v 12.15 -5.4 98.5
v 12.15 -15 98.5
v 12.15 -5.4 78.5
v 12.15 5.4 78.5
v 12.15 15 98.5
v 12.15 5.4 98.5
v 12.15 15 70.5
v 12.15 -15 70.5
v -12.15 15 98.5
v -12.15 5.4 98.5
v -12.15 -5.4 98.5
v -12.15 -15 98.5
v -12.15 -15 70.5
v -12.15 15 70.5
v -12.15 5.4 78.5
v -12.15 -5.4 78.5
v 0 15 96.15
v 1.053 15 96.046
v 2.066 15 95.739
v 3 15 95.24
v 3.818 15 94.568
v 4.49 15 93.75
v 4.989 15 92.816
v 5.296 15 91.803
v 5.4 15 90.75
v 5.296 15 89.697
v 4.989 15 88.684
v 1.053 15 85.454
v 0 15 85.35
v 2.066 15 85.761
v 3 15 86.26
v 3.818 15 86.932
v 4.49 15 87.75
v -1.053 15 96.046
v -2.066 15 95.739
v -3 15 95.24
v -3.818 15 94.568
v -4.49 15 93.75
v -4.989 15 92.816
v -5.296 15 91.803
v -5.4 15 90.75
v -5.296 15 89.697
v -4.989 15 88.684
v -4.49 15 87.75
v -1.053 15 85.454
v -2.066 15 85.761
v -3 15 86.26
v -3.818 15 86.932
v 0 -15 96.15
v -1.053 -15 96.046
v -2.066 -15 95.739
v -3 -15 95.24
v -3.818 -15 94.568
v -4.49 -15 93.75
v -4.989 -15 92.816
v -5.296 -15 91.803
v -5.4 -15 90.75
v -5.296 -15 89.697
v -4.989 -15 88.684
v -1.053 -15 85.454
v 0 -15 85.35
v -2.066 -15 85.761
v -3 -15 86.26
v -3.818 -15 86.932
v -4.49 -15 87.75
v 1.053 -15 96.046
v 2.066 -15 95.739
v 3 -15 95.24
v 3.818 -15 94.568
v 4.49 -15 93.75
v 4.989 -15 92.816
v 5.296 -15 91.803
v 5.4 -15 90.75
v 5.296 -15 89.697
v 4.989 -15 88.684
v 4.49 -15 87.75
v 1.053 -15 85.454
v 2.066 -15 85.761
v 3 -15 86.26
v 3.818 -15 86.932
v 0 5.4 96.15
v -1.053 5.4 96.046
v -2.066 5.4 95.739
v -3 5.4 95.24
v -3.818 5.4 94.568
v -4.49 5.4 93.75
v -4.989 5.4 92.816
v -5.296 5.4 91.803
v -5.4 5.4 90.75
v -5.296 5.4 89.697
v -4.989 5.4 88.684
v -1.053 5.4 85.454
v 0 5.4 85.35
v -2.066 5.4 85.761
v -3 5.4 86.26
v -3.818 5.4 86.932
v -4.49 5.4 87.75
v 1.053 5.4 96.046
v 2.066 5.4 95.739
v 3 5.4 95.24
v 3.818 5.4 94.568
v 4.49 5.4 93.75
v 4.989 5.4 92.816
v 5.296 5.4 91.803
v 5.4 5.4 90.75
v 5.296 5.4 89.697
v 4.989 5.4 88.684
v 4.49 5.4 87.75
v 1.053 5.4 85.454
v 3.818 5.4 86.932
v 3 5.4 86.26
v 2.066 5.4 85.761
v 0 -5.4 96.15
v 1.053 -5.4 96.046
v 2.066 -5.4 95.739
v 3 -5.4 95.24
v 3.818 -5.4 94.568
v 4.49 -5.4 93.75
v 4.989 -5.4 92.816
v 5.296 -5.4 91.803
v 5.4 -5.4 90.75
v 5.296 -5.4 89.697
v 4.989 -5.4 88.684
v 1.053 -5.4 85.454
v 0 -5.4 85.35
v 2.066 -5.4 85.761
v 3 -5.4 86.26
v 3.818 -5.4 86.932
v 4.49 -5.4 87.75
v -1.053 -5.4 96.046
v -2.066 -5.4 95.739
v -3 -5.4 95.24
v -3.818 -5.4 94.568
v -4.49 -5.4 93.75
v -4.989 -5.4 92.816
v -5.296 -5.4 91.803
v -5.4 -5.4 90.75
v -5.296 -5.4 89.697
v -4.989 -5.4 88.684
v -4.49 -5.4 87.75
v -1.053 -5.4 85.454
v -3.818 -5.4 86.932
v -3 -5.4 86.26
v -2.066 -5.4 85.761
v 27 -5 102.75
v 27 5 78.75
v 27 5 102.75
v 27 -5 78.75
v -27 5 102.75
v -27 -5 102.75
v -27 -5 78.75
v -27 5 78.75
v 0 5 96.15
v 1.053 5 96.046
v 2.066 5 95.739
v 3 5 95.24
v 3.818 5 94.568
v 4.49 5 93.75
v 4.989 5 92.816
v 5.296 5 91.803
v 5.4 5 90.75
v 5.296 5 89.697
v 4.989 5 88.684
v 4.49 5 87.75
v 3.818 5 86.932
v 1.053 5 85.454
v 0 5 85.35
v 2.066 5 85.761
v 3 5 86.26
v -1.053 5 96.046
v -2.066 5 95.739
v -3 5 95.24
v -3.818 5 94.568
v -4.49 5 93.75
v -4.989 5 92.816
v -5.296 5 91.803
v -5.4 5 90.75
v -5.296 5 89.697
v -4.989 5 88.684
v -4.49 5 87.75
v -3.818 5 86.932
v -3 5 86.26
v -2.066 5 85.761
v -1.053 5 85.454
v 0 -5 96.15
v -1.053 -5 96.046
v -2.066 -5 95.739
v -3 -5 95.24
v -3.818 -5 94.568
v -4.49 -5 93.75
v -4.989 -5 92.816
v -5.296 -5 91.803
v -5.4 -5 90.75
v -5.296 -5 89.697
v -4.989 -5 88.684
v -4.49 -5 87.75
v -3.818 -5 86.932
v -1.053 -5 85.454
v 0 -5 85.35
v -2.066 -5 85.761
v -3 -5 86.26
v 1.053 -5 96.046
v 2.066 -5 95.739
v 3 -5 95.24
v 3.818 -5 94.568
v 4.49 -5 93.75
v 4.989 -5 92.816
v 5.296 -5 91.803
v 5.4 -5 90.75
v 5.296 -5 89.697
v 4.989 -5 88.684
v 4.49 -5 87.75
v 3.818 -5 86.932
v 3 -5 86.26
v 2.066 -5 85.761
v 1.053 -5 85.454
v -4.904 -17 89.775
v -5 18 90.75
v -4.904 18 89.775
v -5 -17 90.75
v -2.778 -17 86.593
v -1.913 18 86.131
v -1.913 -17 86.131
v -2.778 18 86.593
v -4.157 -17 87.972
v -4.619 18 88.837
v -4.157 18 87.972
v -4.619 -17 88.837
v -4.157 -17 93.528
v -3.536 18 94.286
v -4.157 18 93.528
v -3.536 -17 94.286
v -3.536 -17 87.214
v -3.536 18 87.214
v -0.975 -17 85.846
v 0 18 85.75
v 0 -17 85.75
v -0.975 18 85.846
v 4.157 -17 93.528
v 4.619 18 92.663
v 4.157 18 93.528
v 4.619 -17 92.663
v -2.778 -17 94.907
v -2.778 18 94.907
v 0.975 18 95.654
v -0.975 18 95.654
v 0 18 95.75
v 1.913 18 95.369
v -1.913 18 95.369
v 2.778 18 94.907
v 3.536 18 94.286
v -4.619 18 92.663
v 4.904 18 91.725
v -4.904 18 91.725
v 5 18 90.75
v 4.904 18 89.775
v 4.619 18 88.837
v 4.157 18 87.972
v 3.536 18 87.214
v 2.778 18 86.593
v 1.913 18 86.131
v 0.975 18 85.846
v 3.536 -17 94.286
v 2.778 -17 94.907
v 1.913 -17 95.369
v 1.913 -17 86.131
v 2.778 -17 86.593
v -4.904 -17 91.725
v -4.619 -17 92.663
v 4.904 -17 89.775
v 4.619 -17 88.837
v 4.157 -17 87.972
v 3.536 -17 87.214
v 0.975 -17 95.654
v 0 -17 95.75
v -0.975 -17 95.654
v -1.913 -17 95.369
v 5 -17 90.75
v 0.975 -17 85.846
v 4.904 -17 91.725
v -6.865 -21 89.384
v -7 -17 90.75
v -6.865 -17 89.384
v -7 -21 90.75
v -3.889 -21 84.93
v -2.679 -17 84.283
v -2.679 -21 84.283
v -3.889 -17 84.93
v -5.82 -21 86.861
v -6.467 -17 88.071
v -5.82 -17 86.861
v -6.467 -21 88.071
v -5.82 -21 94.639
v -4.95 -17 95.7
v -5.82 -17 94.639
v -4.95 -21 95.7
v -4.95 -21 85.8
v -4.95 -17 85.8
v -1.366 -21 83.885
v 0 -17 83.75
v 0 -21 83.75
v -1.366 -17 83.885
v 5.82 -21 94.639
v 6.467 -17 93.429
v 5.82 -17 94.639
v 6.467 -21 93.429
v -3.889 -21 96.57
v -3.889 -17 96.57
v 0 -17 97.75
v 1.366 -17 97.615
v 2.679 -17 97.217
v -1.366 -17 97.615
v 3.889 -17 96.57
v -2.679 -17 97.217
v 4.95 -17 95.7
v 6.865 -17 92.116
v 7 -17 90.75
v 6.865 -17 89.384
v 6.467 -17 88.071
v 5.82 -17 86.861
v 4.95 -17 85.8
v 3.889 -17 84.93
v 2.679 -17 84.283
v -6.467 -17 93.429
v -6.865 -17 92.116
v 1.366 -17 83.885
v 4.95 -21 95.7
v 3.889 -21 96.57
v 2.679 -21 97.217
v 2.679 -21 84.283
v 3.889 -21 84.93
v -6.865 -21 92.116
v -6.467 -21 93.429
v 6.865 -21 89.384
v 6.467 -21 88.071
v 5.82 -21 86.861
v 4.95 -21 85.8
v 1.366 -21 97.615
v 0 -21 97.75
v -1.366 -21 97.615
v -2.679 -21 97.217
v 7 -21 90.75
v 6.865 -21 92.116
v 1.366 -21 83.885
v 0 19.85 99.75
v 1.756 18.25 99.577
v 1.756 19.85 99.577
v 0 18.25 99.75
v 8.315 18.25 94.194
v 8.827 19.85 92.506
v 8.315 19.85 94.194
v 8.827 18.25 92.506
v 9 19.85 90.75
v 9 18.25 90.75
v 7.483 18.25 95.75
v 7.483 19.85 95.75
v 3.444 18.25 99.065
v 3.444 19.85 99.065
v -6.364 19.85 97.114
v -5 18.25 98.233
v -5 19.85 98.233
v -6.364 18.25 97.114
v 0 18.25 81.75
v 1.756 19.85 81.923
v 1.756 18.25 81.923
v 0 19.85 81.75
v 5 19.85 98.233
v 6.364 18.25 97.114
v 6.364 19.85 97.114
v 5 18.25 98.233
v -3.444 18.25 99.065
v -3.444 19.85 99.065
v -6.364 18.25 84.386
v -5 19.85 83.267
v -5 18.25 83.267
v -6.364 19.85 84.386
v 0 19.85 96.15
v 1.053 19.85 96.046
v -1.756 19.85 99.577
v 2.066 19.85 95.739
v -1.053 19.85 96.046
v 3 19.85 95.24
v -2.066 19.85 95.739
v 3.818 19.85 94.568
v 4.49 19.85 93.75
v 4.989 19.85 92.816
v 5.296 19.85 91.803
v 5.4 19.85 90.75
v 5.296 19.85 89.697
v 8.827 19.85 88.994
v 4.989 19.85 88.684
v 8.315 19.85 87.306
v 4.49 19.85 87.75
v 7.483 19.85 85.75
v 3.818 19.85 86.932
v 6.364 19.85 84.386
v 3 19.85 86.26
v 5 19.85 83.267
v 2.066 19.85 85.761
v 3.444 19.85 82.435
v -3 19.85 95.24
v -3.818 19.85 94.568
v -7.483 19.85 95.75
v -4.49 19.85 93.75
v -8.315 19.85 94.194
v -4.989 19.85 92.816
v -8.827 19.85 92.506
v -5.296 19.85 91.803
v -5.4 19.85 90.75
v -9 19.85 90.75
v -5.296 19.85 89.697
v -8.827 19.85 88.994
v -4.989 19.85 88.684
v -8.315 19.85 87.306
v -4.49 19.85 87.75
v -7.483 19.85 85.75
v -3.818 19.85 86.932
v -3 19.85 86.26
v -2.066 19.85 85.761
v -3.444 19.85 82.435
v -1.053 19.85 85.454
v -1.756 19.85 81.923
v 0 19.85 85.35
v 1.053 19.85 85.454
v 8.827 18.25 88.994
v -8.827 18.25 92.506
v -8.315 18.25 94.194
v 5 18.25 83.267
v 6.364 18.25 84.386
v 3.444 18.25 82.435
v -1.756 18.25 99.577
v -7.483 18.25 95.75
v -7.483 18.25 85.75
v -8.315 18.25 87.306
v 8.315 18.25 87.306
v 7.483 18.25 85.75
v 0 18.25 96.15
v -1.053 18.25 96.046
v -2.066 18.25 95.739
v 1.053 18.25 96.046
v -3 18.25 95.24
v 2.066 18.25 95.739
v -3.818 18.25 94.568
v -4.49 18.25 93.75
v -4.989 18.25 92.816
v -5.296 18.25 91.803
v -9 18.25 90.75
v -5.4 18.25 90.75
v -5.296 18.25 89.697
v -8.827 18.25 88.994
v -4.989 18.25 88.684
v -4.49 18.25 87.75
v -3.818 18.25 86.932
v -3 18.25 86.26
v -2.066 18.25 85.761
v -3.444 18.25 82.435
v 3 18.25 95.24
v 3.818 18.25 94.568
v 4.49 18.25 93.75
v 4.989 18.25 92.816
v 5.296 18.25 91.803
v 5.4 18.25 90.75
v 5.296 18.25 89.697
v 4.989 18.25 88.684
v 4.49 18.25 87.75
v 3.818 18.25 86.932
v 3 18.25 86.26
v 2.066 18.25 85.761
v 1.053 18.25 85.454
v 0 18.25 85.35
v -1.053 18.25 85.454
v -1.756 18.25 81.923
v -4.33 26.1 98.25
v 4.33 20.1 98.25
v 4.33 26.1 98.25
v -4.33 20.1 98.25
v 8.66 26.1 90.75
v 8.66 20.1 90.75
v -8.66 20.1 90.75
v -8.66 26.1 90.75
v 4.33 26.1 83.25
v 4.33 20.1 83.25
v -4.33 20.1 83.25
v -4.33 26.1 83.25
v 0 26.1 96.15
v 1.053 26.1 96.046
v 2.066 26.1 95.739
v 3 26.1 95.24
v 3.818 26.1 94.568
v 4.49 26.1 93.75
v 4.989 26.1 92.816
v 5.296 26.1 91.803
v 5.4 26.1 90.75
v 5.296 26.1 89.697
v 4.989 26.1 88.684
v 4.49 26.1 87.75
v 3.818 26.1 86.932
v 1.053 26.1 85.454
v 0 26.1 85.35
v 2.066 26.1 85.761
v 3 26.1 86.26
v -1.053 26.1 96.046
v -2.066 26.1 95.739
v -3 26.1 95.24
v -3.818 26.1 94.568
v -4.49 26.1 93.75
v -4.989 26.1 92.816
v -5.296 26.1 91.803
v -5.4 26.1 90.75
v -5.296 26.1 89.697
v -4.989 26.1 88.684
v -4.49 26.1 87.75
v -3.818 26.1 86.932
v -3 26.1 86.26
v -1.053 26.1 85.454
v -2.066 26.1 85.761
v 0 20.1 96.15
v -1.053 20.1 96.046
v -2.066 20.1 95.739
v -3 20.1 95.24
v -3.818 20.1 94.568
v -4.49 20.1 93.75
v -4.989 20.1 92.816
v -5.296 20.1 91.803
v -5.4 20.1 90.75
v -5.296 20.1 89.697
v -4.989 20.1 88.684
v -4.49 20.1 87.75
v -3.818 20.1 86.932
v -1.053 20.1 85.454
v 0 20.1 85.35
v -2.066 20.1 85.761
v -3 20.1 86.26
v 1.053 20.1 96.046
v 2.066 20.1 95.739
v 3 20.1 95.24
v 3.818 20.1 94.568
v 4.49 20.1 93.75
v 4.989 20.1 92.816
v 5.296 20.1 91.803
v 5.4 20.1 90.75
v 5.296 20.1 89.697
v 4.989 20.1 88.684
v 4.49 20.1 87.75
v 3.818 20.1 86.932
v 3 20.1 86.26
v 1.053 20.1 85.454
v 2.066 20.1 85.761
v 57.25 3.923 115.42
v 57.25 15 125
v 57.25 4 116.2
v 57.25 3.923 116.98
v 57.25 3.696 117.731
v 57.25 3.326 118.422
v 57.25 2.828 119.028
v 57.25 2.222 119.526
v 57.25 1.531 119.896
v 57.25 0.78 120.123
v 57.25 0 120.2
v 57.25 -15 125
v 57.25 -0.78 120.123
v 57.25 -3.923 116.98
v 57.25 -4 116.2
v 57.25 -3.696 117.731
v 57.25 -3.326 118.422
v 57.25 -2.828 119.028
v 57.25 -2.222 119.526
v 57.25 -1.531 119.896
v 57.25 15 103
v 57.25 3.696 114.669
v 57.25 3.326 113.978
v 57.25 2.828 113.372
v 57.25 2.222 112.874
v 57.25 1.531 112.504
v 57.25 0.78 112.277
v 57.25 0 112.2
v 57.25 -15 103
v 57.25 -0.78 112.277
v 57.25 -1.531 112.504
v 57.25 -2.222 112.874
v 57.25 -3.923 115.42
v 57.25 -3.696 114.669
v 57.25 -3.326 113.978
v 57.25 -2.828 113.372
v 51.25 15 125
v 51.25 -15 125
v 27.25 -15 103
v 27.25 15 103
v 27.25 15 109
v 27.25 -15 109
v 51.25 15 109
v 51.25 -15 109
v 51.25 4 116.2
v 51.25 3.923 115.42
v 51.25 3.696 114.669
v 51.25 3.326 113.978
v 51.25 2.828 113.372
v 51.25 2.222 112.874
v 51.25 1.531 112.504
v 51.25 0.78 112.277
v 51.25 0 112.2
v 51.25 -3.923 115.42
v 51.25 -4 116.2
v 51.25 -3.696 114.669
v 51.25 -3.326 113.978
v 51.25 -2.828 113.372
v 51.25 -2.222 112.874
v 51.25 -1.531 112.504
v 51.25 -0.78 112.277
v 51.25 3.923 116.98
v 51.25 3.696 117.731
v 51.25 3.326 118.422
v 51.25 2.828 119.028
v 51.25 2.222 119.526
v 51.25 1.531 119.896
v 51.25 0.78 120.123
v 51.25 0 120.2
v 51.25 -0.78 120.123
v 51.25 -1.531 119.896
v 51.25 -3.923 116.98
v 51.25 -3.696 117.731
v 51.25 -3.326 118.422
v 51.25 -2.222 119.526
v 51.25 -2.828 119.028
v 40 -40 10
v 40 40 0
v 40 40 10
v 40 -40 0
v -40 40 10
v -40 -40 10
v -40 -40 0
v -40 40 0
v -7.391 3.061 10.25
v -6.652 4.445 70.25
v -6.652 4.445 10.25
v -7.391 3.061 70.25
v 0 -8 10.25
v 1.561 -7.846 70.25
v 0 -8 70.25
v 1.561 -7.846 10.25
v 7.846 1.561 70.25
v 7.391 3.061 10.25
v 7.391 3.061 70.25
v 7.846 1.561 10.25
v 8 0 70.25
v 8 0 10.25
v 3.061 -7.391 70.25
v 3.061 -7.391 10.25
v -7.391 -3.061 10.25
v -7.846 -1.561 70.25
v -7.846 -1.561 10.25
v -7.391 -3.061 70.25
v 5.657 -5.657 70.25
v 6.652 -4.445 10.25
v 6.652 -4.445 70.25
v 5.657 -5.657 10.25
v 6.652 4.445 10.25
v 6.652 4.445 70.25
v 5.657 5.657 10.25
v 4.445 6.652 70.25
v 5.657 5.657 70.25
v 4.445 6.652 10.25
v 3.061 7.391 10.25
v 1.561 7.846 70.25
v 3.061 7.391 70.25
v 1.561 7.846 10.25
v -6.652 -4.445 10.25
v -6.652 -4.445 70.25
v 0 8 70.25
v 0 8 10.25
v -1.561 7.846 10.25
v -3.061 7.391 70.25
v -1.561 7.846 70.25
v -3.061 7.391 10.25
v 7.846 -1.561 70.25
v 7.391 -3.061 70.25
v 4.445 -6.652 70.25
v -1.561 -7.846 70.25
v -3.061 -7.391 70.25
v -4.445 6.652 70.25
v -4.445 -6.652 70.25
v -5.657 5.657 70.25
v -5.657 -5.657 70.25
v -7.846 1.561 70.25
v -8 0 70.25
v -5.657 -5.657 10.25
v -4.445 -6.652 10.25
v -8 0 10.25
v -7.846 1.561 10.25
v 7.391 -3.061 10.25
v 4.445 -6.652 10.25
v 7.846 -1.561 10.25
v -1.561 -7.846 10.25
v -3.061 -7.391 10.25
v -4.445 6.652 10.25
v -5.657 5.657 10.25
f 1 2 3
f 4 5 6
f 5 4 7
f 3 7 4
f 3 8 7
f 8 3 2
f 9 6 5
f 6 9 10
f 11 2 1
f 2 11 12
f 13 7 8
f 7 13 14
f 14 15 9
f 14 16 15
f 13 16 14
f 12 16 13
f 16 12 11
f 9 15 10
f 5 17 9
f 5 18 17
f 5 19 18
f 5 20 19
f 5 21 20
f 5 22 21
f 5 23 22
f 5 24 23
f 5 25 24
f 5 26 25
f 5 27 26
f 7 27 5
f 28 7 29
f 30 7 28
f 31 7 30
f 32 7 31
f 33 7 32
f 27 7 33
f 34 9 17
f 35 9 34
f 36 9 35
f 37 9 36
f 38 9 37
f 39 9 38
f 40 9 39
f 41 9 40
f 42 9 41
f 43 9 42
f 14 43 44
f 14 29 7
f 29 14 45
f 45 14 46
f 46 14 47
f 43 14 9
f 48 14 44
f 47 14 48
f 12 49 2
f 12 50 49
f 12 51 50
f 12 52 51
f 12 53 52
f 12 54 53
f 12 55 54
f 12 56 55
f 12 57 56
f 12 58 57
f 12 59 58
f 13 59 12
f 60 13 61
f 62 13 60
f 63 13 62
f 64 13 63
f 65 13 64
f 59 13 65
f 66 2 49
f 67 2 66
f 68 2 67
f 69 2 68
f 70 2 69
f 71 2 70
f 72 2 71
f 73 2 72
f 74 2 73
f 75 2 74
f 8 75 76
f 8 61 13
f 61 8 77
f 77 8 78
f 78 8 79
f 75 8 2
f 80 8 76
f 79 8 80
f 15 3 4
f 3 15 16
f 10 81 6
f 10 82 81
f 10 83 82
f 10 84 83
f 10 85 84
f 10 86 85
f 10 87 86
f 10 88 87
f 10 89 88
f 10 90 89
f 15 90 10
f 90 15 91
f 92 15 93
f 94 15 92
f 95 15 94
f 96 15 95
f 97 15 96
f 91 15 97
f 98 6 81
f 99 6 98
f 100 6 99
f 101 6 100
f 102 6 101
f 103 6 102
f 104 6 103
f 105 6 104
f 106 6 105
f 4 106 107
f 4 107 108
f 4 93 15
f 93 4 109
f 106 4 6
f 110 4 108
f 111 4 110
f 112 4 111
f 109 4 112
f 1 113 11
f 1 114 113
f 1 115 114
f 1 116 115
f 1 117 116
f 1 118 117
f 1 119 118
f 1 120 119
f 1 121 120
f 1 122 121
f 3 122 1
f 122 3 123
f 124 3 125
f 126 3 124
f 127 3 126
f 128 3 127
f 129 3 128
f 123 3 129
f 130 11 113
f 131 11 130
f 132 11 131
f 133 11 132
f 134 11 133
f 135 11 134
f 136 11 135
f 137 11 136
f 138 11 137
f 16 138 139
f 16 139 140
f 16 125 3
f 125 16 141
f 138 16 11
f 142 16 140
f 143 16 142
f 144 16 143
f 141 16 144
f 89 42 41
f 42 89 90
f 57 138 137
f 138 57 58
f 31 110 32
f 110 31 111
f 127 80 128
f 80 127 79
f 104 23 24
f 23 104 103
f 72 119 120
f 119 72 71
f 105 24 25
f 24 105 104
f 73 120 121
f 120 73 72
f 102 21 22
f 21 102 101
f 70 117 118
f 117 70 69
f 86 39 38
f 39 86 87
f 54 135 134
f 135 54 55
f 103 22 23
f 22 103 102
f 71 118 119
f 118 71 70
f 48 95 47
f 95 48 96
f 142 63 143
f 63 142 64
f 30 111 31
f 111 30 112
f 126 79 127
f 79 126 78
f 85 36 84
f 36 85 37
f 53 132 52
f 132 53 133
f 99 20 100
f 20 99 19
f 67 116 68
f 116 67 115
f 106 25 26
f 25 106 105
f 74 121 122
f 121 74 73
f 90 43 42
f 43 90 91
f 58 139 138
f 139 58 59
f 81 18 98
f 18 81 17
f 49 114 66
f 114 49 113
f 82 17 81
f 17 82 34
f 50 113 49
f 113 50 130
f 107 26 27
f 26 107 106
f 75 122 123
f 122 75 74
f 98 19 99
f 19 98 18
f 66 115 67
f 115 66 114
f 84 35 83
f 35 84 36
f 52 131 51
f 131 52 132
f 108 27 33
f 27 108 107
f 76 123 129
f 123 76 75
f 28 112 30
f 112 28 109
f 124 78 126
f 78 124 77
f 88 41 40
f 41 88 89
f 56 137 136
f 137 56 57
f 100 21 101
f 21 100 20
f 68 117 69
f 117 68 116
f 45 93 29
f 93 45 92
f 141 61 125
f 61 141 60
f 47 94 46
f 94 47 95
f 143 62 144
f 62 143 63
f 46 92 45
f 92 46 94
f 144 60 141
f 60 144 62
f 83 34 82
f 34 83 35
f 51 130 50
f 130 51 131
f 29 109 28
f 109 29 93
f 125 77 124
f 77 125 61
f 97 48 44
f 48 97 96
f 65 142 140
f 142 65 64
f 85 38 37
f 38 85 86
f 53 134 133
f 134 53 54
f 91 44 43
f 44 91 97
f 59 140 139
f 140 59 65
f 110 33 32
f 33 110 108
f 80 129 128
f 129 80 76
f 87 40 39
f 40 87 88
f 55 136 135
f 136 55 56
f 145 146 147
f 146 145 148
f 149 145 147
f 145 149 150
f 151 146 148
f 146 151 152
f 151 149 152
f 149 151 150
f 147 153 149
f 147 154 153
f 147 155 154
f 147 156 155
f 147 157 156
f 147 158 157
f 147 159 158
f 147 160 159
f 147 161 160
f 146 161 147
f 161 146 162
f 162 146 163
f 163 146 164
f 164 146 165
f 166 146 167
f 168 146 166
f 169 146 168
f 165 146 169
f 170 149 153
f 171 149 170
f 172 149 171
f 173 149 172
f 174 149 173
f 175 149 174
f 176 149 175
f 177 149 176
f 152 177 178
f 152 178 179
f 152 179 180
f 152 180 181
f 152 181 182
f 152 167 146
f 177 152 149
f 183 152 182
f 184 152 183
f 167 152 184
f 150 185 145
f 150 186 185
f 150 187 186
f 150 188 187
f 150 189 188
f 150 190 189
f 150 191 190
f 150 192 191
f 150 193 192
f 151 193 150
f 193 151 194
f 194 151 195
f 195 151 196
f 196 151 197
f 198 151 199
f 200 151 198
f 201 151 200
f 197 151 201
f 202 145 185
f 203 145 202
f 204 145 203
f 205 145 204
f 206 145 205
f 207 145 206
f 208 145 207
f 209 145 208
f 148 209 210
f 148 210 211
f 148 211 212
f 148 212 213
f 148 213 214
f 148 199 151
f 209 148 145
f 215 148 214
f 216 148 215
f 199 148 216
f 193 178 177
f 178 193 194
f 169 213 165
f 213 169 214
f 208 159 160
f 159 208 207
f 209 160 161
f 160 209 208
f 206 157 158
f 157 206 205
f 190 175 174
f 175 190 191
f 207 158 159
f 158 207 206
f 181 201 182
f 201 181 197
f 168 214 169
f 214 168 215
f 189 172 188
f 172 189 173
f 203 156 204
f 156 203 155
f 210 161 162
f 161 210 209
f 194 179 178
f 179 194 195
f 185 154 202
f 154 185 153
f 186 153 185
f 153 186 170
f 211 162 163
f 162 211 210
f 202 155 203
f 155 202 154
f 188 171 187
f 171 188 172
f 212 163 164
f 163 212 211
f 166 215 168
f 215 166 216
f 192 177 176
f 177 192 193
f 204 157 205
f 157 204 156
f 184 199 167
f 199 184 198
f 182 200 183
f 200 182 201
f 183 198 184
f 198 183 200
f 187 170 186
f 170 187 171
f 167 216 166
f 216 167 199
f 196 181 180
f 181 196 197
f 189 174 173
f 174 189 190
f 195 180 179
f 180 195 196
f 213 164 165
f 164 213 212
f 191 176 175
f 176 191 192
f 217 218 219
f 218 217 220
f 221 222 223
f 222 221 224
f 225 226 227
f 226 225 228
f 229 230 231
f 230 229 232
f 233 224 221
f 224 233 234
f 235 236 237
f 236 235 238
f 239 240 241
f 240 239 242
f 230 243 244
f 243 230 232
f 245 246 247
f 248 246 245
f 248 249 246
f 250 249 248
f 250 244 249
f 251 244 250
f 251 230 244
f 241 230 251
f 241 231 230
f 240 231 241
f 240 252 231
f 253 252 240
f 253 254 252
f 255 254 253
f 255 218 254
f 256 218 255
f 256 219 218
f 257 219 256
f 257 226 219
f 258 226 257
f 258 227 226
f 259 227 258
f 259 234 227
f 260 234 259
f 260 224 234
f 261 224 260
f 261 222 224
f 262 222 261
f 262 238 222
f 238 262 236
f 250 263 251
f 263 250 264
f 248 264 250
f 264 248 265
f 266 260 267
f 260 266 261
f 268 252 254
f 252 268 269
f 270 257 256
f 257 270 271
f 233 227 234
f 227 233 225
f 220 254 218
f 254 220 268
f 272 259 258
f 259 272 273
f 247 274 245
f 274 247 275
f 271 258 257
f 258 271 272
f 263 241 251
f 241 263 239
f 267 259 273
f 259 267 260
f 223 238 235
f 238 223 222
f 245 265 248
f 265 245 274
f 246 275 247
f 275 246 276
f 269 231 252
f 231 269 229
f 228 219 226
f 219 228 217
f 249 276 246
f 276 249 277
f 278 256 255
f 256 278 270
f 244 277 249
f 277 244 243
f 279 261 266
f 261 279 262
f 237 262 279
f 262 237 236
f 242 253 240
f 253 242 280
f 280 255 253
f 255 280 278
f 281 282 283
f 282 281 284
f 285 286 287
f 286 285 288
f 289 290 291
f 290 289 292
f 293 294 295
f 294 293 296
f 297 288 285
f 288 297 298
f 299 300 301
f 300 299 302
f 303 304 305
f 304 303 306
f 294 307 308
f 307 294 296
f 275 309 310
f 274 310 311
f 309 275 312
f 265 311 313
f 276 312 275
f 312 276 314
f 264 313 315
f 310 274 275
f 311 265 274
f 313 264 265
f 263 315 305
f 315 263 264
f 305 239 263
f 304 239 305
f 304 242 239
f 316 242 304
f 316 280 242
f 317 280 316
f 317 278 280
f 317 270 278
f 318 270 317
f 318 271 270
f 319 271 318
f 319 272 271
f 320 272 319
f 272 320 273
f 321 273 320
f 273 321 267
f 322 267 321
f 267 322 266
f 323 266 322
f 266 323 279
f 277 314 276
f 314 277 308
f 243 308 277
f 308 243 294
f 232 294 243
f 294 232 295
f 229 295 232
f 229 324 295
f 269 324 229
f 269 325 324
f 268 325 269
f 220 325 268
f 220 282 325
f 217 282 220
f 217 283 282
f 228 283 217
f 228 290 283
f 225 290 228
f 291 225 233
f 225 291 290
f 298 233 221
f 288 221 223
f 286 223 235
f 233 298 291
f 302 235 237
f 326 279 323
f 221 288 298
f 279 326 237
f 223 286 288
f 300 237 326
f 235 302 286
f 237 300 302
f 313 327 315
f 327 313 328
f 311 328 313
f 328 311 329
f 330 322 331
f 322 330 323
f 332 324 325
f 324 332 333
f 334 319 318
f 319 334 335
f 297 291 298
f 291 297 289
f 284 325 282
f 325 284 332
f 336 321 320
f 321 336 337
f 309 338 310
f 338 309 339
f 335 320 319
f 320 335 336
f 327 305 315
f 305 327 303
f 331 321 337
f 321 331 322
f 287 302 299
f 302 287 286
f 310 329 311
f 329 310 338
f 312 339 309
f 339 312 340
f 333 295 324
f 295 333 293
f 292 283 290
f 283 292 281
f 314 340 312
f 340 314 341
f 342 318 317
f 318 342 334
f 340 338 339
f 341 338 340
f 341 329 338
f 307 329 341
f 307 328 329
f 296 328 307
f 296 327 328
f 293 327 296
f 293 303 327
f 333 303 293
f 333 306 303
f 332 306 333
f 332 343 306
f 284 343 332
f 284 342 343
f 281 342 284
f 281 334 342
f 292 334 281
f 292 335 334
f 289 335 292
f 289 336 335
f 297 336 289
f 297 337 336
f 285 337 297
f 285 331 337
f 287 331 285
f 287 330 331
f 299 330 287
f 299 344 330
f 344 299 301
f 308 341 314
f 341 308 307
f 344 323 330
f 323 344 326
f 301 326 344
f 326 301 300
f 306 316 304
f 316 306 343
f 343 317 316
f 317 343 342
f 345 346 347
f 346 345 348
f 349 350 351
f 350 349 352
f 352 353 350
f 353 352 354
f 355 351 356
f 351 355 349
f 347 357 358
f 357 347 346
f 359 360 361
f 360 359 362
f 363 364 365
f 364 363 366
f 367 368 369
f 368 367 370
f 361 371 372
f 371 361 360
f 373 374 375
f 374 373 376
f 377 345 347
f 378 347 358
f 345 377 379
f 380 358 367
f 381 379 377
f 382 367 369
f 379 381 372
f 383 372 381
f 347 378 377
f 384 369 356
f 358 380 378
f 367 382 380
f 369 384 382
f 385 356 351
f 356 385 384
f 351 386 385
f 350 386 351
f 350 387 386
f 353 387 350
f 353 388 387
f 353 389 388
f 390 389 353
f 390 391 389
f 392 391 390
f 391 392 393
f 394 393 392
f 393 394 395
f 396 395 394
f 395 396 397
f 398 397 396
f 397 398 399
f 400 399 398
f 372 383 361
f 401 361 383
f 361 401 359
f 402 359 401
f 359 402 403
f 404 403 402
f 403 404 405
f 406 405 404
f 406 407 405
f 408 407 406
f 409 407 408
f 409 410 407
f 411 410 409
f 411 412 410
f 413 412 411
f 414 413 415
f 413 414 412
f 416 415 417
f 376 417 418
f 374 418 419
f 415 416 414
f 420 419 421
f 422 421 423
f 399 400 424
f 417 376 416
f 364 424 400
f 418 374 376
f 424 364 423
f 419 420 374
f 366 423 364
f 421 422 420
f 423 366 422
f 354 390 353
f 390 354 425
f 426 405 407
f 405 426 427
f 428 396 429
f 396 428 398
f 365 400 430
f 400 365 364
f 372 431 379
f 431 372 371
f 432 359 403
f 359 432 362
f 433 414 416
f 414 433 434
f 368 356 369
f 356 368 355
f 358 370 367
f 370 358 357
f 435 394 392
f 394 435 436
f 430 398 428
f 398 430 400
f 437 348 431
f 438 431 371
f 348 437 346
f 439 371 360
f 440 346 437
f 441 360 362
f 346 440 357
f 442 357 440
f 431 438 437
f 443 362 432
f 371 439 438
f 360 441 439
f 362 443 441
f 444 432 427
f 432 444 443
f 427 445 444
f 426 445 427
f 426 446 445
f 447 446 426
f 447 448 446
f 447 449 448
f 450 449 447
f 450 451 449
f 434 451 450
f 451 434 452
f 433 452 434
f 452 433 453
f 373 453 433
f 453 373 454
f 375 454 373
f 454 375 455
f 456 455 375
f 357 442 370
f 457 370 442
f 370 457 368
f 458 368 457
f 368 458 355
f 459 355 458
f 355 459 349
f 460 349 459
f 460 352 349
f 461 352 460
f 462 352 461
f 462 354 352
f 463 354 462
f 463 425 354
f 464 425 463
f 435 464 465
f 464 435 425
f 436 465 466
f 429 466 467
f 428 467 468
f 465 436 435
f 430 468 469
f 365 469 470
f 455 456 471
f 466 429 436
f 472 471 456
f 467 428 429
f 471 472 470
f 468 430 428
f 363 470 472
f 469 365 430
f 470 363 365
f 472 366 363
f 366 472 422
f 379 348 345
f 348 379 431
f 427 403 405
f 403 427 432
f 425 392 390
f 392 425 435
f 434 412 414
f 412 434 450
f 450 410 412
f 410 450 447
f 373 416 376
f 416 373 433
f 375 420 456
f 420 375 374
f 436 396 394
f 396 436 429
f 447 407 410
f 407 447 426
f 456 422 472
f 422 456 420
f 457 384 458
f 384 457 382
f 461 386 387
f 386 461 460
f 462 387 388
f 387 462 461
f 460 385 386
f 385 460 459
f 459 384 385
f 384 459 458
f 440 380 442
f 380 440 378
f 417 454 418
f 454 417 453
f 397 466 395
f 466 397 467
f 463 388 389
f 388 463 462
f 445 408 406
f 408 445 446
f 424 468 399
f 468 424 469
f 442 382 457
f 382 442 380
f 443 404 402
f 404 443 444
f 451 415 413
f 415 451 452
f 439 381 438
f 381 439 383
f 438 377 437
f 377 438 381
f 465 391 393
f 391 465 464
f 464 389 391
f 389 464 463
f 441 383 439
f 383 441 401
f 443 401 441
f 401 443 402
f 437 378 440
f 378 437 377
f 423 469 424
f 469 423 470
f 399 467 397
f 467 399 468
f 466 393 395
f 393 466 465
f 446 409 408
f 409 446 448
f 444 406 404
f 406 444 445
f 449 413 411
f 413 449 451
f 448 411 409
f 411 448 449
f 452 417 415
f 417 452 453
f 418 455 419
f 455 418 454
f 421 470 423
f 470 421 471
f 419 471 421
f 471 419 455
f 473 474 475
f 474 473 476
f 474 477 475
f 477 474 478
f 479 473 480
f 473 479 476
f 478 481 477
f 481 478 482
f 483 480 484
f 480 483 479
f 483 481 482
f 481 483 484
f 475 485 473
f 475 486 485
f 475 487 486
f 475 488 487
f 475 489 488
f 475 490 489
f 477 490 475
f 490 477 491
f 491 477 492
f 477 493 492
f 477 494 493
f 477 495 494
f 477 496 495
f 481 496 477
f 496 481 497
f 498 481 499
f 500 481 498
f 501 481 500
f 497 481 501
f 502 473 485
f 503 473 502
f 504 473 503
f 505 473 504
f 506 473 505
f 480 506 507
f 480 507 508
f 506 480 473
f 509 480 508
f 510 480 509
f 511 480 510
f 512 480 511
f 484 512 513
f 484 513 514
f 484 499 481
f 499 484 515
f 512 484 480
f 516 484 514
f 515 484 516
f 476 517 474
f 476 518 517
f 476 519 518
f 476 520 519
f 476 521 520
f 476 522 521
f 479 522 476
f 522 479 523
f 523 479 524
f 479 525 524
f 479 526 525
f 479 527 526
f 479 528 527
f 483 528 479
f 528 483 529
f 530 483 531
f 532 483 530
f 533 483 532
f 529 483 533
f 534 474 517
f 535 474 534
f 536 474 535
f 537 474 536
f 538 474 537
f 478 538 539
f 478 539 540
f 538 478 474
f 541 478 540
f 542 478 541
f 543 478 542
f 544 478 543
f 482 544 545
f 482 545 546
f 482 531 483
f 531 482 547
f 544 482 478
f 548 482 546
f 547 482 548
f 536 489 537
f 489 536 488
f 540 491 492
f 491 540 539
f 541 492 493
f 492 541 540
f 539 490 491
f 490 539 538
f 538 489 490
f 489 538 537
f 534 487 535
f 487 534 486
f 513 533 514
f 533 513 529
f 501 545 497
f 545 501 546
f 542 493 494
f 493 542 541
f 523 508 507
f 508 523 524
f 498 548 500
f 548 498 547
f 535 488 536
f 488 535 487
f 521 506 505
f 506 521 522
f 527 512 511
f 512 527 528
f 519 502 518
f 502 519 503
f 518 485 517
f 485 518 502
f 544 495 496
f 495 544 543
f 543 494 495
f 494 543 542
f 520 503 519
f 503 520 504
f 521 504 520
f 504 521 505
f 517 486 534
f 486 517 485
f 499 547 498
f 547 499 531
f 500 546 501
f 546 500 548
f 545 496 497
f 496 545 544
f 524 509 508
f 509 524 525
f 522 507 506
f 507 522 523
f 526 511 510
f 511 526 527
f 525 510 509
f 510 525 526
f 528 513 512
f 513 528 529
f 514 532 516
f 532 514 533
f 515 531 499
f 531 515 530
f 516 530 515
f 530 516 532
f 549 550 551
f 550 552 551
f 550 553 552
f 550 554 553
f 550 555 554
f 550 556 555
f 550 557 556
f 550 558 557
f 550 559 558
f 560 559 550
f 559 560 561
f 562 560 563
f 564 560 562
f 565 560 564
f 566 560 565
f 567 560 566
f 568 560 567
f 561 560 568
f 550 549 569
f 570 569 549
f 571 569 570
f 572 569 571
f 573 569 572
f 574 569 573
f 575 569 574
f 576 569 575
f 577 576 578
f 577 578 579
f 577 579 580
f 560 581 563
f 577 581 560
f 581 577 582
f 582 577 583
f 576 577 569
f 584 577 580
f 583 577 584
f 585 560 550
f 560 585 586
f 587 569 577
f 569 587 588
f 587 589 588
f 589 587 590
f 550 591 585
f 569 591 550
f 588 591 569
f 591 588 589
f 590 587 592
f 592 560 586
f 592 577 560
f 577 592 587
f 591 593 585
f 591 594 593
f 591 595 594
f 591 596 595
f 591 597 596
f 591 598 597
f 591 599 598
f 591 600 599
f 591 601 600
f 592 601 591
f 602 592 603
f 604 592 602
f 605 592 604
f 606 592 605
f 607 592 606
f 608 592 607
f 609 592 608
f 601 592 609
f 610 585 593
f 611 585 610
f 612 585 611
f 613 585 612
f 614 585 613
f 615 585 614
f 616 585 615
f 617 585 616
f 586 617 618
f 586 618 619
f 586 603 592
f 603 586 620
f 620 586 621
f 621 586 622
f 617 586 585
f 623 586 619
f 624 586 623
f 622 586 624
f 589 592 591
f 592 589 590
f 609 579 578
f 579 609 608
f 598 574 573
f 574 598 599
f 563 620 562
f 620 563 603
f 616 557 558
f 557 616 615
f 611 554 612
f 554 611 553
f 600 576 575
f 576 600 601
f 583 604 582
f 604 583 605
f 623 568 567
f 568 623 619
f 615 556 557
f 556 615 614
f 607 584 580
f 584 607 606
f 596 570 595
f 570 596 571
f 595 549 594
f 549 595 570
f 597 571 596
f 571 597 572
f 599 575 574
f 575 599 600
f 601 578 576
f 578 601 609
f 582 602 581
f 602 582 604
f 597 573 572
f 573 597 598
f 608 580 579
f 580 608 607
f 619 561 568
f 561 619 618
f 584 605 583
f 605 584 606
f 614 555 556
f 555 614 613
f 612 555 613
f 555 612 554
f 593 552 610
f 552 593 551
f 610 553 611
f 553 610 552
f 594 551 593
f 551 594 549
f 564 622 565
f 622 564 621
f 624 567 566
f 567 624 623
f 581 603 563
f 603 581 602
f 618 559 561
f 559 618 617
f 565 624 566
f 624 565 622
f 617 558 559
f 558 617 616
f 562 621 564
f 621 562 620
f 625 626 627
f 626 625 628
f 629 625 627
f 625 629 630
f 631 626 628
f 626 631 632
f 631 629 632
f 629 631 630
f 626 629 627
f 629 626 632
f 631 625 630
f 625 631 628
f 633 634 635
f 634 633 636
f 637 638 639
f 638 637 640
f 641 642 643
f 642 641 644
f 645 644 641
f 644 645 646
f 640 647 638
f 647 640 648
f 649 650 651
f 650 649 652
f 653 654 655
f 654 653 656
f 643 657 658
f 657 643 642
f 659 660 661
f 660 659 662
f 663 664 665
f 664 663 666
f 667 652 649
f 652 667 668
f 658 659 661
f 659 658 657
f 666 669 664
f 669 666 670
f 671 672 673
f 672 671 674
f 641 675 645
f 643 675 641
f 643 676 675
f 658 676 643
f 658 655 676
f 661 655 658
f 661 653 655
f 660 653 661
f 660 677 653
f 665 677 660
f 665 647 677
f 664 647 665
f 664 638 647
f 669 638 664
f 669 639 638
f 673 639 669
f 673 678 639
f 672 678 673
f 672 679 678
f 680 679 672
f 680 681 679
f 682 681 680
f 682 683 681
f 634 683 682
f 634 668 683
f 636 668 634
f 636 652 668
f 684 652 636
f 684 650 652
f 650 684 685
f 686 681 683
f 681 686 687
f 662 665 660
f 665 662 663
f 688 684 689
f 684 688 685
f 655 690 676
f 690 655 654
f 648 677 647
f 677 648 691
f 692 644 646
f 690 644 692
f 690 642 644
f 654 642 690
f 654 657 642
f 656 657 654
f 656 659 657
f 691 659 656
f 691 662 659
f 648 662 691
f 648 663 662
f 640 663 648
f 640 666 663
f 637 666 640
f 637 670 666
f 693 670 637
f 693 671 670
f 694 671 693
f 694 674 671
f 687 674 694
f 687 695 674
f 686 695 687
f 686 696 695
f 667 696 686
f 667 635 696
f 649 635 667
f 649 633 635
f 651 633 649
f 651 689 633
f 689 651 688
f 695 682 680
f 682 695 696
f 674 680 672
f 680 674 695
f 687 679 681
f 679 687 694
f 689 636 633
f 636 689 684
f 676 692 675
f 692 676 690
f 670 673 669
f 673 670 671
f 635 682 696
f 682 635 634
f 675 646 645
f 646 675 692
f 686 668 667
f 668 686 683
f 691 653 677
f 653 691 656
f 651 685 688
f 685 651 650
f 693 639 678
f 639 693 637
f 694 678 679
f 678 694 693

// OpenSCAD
$fn = 32;

// ------------------------------------------------------------------------
// Lamp arm: column d16 x 60 mm, arm 54 mm
// Every part is its own module, assembly() places every instance.
// ------------------------------------------------------------------------

// --- part 1 ---
module lamp_base() {
  difference() {
    translate([-40, -40, 0]) cube([80, 80, 10]);
  }
}

// --- part 2 ---
module lamp_column() {
  cylinder(h = 60, d = 16);
}

// --- part 3 ---
module head_fork() {
  difference() {
    translate([-12.15, -15, 0]) cube([24.3, 30, 28]);
    translate([-13.15, -5.4, 8]) cube([26.3, 10.8, 21]);
    translate([0, 0, 20.25]) rotate([90, 0, 0]) cylinder(h = 32, d = 10.8, center = true);
  }
}

// --- part 4 ---
module lamp_arm() {
  difference() {
    translate([-27, -5, 0]) cube([54, 10, 24]);
    translate([0, 0, 12]) rotate([90, 0, 0]) cylinder(h = 12, d = 10.8, center = true);
  }
}

// --- part 5 ---
module arm_pin() {
  rotate([0, 90, 0]) cylinder(h = 36, d = 10, center = true);
  translate([-21, 0, 0]) rotate([0, 90, 0]) cylinder(h = 4, d = 14);
}

// --- part 6 ---
module arm_washer() {
  difference() {
      translate([0, 0, 0]) cylinder(h = 1.6, d = 18);
      translate([0, 0, -1]) cylinder(h = 3.6, d = 10.8);
    }
}

// --- part 7 ---
module arm_nut() {
  difference() {
    linear_extrude(height = 6) polygon(points = [[8.66, 0], [4.33, 7.5], [-4.33, 7.5], [-8.66, 0], [-4.33, -7.5], [4.33, -7.5]]);
    translate([0, 0, -1]) cylinder(h = 8, d = 10.8);
  }
}

// --- part 8 ---
module shade_bracket() {
  difference() {
    translate([-15, -15, 0]) cube([30, 30, 22]);
    translate([-16, -16, 6]) cube([25, 32, 17]);
    translate([12, 0, 13.2]) rotate([0, 90, 0]) cylinder(h = 8, d = 8, center = true);
  }
}

// --- assembly ---
module assembly() {
  color([0.80, 0.24, 0.20]) translate([0, 0, 0]) rotate([0, 0, 0]) lamp_base();
  color([0.20, 0.45, 0.75]) translate([0, 0, 10.25]) rotate([0, 0, 0]) lamp_column();
  color([0.25, 0.62, 0.32]) translate([0, 0, 70.5]) rotate([0, 0, 0]) head_fork();
  color([0.92, 0.70, 0.18]) translate([0, 0, 78.75]) rotate([0, 0, 0]) lamp_arm();
  color([0.58, 0.35, 0.70]) translate([0, 0, 90.75]) rotate([0, 0, 90]) arm_pin();
  color([0.16, 0.66, 0.66]) translate([0, 19.85, 90.75]) rotate([90, 0, 0]) arm_washer();
  color([0.85, 0.48, 0.18]) translate([0, 26.1, 90.75]) rotate([90, 0, 0]) arm_nut();
  color([0.55, 0.60, 0.65]) translate([42.25, 0, 103]) rotate([0, 0, 0]) shade_bracket();
}

assembly();
